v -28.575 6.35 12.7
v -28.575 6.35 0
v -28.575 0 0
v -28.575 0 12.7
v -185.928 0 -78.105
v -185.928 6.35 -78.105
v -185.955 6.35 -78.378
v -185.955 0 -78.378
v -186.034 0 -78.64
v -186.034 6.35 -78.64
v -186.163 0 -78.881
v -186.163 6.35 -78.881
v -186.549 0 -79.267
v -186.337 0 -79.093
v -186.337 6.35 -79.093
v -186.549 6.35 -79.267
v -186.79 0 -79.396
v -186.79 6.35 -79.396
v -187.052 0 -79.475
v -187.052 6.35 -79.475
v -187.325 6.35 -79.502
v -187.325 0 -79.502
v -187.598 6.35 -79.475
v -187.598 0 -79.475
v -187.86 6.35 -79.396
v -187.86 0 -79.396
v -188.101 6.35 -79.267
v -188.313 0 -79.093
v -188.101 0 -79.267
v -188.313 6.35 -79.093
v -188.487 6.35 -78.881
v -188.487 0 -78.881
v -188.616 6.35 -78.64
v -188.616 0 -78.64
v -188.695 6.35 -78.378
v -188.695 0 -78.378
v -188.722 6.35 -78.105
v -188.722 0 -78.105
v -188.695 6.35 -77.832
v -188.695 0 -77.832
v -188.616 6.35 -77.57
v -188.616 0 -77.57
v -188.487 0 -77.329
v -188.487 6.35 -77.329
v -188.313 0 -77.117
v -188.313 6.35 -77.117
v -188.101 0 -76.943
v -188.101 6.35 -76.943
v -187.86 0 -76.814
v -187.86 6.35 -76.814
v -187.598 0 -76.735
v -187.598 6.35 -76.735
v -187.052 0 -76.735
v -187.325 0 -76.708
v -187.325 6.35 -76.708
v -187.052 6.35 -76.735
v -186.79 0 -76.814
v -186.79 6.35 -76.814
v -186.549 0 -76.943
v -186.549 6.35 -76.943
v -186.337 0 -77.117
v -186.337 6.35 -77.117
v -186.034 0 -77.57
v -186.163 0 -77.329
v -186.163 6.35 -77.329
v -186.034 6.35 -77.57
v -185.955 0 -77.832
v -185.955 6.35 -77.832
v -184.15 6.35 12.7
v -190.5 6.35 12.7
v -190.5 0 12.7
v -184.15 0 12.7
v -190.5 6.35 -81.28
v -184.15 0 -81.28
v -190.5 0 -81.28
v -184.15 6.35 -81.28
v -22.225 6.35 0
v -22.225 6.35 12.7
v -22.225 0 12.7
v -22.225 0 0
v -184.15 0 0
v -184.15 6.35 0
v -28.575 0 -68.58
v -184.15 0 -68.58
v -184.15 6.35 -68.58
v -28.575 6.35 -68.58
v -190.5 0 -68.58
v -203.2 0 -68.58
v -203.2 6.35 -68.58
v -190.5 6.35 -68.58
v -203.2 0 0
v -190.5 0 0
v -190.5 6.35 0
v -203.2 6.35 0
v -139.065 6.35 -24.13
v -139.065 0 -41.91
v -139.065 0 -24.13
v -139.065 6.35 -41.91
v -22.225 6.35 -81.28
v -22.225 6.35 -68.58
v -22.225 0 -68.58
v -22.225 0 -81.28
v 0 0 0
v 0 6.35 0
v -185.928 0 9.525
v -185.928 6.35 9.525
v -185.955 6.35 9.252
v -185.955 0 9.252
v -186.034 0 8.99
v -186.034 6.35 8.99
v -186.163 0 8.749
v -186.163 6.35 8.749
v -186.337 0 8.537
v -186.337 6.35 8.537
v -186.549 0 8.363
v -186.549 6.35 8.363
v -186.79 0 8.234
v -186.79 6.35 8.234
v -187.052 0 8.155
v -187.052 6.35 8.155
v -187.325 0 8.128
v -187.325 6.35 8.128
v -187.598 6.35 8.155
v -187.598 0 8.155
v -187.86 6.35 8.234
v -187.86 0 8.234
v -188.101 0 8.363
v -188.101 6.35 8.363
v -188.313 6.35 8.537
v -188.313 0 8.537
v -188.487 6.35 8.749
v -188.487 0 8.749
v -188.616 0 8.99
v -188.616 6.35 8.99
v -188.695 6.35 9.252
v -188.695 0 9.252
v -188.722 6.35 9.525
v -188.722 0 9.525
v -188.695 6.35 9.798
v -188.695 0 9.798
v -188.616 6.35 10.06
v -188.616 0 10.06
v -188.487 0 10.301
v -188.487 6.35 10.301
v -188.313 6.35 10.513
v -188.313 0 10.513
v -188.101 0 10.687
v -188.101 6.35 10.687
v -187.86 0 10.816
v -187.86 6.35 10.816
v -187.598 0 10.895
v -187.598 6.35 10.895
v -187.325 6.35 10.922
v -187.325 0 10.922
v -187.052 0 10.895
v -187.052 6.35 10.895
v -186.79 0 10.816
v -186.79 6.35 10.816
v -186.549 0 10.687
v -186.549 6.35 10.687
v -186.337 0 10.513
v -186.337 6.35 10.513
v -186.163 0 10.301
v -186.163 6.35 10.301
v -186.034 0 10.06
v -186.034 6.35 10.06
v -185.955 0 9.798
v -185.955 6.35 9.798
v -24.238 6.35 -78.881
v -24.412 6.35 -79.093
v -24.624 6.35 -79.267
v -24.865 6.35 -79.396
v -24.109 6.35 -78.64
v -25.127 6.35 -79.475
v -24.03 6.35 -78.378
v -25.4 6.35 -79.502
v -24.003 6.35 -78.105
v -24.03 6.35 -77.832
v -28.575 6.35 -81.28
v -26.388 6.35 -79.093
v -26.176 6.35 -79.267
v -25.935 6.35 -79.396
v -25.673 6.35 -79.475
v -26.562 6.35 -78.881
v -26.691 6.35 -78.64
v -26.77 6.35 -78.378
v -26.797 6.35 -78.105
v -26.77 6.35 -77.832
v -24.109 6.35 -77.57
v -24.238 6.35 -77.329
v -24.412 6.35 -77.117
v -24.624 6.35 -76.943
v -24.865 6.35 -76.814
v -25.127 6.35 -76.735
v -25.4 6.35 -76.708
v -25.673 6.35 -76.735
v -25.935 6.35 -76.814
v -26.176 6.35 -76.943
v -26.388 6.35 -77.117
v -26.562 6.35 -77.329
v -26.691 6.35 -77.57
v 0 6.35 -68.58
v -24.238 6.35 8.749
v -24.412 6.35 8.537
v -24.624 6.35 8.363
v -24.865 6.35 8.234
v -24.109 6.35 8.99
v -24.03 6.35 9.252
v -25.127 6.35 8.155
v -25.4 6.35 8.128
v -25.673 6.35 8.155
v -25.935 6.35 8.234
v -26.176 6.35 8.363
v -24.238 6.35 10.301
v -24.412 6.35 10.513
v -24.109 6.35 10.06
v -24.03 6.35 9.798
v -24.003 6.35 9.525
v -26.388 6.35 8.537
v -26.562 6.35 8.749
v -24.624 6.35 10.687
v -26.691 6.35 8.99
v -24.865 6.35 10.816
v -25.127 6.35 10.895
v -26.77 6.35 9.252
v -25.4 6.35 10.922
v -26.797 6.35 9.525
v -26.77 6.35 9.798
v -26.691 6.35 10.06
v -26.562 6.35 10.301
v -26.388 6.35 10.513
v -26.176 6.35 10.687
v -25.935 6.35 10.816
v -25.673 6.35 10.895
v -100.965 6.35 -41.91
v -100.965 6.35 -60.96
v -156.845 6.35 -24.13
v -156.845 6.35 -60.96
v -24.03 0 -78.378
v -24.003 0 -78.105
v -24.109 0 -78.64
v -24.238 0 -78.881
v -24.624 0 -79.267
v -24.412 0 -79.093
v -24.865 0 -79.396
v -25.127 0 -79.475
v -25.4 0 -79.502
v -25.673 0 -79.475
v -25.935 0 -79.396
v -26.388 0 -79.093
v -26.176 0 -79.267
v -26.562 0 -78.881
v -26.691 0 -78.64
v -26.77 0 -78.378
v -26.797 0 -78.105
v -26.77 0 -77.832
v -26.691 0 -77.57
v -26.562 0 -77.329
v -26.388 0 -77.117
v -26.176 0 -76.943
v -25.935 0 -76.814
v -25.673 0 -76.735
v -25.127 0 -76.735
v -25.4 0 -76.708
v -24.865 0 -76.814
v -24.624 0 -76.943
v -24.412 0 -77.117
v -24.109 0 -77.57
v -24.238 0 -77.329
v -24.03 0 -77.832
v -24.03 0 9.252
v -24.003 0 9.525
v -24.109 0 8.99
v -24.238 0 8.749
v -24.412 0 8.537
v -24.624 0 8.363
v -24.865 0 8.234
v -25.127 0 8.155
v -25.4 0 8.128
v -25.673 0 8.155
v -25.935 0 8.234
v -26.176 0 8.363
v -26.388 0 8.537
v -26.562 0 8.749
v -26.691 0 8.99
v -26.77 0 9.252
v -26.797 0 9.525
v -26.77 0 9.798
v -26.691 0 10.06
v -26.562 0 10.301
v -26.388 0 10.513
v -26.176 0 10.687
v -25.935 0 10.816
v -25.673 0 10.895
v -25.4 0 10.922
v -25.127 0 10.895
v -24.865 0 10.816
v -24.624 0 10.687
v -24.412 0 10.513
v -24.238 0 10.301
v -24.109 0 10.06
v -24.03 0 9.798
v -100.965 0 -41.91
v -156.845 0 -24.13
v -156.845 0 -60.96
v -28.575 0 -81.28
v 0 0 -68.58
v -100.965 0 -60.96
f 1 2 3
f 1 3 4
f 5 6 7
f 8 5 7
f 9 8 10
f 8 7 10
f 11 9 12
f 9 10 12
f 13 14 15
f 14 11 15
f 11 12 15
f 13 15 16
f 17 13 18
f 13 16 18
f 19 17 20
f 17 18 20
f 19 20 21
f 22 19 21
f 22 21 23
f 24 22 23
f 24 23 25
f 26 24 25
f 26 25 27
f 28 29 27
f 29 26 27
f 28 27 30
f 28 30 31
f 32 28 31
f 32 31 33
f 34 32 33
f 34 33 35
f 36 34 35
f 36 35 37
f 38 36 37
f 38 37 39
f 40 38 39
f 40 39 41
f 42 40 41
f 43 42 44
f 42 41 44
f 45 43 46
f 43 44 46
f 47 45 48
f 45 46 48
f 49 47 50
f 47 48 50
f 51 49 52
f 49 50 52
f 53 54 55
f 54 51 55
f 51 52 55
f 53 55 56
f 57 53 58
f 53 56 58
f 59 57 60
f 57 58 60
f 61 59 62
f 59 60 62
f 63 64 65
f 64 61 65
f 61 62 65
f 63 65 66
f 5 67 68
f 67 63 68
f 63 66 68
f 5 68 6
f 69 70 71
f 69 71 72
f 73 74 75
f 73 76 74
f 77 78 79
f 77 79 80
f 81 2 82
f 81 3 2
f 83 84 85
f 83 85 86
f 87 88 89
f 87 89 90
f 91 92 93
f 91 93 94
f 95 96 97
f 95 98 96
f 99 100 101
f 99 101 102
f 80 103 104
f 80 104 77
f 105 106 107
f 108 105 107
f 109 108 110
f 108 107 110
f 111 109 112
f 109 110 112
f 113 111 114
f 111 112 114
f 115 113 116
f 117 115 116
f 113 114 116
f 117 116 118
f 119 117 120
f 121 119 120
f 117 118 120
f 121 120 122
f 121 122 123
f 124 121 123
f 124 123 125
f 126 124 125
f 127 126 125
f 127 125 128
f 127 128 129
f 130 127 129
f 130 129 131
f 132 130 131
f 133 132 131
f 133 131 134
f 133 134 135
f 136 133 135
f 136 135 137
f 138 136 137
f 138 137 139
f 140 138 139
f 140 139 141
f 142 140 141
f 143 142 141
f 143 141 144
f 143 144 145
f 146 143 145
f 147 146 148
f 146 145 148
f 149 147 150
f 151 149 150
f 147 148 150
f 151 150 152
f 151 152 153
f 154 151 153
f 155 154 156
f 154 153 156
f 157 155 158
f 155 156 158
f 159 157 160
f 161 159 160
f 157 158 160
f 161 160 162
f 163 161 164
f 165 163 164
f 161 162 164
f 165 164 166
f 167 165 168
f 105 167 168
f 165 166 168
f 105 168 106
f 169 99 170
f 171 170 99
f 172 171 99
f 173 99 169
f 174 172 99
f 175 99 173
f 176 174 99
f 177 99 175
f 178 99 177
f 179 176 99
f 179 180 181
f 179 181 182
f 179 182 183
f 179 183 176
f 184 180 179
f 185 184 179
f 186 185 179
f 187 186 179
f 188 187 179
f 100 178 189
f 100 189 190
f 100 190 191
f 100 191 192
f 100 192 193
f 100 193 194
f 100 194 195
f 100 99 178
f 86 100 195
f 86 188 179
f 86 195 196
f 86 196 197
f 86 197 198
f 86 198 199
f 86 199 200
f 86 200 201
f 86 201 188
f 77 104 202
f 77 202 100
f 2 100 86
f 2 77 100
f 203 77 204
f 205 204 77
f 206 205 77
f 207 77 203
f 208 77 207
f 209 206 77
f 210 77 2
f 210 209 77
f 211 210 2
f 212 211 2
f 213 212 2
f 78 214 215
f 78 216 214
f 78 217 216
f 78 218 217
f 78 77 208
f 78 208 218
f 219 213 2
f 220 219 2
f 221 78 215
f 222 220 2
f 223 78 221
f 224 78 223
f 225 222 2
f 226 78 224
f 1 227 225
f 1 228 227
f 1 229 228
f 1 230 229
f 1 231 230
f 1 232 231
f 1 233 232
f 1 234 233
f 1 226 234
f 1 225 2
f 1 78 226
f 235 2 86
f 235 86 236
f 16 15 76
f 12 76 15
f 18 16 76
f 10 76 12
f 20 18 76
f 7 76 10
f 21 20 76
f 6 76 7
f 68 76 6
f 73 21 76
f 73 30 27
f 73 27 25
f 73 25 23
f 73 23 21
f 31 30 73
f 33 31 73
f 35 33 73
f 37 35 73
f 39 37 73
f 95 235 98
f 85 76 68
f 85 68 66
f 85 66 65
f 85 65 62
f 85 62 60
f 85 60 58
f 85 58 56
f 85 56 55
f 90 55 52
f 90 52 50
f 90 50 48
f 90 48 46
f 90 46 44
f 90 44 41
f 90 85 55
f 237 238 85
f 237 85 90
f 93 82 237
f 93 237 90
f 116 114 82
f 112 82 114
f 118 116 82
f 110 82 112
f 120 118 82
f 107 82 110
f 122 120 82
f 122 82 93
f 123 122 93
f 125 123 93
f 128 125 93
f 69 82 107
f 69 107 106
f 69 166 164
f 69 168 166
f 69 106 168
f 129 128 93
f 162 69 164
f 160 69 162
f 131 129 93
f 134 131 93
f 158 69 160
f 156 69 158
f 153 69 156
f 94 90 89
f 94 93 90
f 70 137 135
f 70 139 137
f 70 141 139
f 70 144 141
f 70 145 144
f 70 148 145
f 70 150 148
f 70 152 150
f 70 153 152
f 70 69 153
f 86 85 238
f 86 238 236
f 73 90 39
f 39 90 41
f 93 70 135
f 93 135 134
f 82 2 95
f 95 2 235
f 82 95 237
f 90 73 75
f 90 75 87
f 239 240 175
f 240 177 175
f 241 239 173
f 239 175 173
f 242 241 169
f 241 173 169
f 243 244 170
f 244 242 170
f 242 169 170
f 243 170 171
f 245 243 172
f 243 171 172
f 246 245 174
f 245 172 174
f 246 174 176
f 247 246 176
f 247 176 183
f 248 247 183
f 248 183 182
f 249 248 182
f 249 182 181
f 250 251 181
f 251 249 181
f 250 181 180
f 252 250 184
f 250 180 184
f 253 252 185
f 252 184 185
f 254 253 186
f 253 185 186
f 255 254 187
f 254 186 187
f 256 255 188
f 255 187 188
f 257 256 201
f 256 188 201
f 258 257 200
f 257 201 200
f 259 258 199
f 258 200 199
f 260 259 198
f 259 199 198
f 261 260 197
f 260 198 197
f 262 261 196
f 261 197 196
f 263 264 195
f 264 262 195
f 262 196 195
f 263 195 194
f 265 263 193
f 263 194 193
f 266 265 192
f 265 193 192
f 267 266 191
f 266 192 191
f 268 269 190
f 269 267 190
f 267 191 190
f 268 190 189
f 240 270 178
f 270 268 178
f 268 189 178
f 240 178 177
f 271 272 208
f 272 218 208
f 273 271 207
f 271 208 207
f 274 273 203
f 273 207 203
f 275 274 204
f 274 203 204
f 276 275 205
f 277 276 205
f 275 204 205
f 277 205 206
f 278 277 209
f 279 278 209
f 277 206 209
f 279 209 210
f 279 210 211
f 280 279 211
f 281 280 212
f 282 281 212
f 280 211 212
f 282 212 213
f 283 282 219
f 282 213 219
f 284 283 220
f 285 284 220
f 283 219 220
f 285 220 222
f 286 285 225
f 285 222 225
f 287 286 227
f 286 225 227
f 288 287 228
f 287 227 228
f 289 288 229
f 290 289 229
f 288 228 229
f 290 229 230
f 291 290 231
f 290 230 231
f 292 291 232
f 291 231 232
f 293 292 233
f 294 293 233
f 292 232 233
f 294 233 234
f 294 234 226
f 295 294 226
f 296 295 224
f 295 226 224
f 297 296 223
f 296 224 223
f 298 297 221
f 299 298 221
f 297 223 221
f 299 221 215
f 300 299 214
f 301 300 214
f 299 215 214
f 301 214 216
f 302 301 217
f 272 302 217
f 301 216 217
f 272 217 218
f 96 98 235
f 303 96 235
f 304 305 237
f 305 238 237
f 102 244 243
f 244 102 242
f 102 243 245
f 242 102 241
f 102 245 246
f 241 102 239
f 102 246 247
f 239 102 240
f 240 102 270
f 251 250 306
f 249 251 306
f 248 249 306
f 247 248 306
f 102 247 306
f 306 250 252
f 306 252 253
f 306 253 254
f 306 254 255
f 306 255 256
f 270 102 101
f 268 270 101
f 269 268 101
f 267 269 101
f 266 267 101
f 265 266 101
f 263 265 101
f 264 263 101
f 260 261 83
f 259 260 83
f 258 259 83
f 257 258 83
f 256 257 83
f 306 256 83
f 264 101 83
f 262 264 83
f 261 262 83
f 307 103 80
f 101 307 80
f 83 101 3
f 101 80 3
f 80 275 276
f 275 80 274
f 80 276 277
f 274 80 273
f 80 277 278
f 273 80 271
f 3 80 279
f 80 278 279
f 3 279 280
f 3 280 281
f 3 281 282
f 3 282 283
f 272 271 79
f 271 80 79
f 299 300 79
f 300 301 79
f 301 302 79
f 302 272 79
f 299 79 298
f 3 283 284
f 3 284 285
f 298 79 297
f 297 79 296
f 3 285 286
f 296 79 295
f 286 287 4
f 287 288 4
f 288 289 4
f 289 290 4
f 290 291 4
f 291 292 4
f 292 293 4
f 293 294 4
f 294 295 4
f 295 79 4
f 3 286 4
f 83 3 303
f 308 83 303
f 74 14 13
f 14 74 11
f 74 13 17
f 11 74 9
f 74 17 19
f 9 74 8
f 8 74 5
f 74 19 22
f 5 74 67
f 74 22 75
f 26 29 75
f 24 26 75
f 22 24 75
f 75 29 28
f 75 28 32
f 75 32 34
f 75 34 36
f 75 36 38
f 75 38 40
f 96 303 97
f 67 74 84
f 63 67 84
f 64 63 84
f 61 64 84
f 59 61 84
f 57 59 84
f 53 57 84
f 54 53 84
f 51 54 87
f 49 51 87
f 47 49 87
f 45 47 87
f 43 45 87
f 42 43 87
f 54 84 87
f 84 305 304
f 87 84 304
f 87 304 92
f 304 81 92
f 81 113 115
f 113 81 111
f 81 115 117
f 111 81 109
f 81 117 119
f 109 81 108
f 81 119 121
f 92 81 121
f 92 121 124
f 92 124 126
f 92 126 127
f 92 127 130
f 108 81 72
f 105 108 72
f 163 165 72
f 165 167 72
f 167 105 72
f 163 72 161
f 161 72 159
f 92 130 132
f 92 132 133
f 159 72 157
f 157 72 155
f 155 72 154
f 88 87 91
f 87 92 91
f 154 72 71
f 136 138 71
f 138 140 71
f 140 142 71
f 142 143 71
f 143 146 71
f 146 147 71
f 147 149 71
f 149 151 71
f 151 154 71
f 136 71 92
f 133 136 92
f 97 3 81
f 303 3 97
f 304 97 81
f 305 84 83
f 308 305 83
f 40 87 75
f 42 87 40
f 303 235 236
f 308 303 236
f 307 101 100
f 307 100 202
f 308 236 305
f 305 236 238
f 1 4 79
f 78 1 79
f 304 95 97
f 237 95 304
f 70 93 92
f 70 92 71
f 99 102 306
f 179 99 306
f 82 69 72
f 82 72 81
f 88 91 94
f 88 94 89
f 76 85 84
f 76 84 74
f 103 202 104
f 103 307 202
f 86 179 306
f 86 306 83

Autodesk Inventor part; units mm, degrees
ref_plane "YZ Plane" through (0, 0, 0) normal (1, 0, 0) x (0, 1, 0)
ref_plane "XZ Plane" through (0, 0, 0) normal (0, 1, 0) x (-1, 0, 0)
ref_plane "XY Plane" through (0, 0, 0) normal (0, 0, 1) x (1, 0, 0)
sketch "Sketch1" plane through (0, 0, 0) normal (0, 1, 0) x (-1, 0, 0)
  line L0 (0, 0) -> (203.2, 0)
  line L1 (203.2, 0) -> (203.2, -68.58)
  line L2 (203.2, -68.58) -> (0, -68.58)
  line L3 (0, -68.58) -> (0, 0)
  dimension "d0" = 203.2
  dimension "d1" = 68.58
extrude "Extrusion1" add sketch "Sketch1" along normal blind 6.35
sketch "Sketch2" plane through (0, 6.35, 0) normal (0, 1, 0) x (1, 0, 0)
  line L0 (-184.15, 0) -> (-190.5, 0)
  line L1 (-190.5, 0) -> (-190.5, -12.7)
  line L2 (-190.5, -12.7) -> (-184.15, -12.7)
  line L3 (-184.15, -12.7) -> (-184.15, 0)
  circle A0 centre (-187.325, -9.525) radius 1.397
  line L4 (-203.2, 0) -> (0, 0) projected
  line L5 (-22.225, 0) -> (-28.575, 0)
  line L6 (-28.575, 0) -> (-28.575, -12.7)
  line L7 (-28.575, -12.7) -> (-22.225, -12.7)
  line L8 (-22.225, -12.7) -> (-22.225, 0)
  circle A1 centre (-25.4, -9.525) radius 1.397
  dimension "d4" = 12.7
  dimension "d5" = 6.35
  dimension "d6" = 2.794
  dimension "d7" = 3.175
  dimension "d8" = 3.175
  dimension "d9" = 0
  dimension "d10" = 12.7
  dimension "d11" = 12.7
  dimension "d12" = 6.35
  dimension "d13" = 2.794
  dimension "d14" = 3.175
  dimension "d15" = 3.175
  dimension "d16" = 0
  dimension "d20" = 25.4
extrude "Extrusion2" add sketch "Sketch2" against normal blind 6.35
ref_plane "Work Plane1" through (-184.15, 0, -34.29) normal (0, 0, 1) x (1, 0, 0)
mirror "Mirror1" about plane through (-184.15, 0, -34.29) normal (0, 0, 1) of "Extrusion2"
sketch "Sketch3" plane through (0, 6.35, 0) normal (0, 1, 0) x (1, 0, 0)
  line L0 (-156.845, 41.91) -> (-100.965, 41.91)
  line L1 (-100.965, 41.91) -> (-100.965, 60.96)
  line L2 (-100.965, 60.96) -> (-156.845, 60.96)
  line L3 (-156.845, 60.96) -> (-156.845, 41.91)
  line L4 (-156.845, 41.91) -> (-139.065, 41.91)
  line L5 (-139.065, 41.91) -> (-139.065, 24.13)
  line L6 (-139.065, 24.13) -> (-156.845, 24.13)
  line L7 (-156.845, 24.13) -> (-156.845, 41.91)
  line L8 (-28.575, 68.58) -> (-184.15, 68.58) projected
  circle A0 centre (-187.325, 78.105) radius 1.397 projected
  point P0 (0, 0)
  dimension "d21" = 19.05
  dimension "d22" = 55.88
  dimension "d23" = 17.78
  dimension "d24" = 17.78
  dimension "d25" = 7.62
  dimension "d28" = 30.48
extrude "Extrusion3" cut sketch "Sketch3" against normal blind 25.4 contours L3 L2 L1 L0 | L0 L5 L6 L7
properties part number "BackPanel"
